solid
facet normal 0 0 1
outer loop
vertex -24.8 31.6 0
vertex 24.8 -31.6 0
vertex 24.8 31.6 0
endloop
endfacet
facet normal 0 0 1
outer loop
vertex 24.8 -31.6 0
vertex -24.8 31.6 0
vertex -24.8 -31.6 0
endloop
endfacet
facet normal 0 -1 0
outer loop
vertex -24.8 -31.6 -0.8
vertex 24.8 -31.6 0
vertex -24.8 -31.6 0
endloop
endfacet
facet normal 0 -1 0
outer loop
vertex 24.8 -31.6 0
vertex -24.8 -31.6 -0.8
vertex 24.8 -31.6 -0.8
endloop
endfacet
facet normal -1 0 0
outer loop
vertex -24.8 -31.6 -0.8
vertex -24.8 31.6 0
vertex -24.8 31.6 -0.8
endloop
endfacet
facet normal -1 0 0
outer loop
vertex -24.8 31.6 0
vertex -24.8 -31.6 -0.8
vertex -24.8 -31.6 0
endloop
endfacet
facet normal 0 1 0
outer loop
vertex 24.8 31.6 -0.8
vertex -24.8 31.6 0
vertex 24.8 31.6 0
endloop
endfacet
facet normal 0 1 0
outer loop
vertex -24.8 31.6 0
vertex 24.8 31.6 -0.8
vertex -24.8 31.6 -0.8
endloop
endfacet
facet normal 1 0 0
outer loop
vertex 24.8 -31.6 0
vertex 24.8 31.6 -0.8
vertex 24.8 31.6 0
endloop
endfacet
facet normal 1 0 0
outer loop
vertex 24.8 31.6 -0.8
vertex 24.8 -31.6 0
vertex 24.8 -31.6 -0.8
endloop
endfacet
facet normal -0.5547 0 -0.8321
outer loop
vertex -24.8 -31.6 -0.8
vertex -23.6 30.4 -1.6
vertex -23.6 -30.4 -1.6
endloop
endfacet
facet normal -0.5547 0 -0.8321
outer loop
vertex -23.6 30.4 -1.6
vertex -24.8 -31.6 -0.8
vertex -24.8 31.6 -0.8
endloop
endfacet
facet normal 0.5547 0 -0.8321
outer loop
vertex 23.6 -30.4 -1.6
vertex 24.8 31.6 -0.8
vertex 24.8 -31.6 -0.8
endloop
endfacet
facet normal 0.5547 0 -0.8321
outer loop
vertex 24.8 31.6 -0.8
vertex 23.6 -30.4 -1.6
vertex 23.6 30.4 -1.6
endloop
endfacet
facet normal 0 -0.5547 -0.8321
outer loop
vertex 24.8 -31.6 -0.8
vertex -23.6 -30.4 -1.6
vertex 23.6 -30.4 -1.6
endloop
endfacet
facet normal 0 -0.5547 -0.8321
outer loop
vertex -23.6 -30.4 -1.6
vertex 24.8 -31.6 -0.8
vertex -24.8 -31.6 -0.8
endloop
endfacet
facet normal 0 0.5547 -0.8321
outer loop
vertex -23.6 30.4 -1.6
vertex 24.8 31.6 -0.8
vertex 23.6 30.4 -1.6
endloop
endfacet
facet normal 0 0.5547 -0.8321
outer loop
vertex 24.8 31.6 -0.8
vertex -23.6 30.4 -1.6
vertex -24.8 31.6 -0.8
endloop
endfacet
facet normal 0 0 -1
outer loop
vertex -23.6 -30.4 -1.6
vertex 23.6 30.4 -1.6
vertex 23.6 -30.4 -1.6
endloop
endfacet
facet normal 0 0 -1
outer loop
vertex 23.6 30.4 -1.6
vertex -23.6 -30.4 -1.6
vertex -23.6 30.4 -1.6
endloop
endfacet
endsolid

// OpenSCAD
// file: ../p/rect.scad
use <../lib.scad>
function ldraw_lib__rect() = [
// 0 Rectangle
// 0 Name: rect.dat
// 0 Author: James Jessiman
// 0 !LDRAW_ORG Primitive UPDATE 2010-01
// 0 !LICENSE Licensed under CC BY 2.0 and CC BY 4.0 : see CAreadme.txt
// 
// 0 BFC CERTIFY CCW
  [0,"BFC","CERTIFY"],
  [0,"BFC","CCW"],
// 
// 0 !HISTORY 2002-04-05 [hafhead] Added BFC statement
// 0 !HISTORY 2002-04-25 [PTadmin] Official Update 2002-02
// 0 !HISTORY 2007-06-24 [PTadmin] Header formatted for Contributor Agreement
// 0 !HISTORY 2008-07-01 [PTadmin] Official Update 2008-01
// 0 !HISTORY 2010-01-17 [mikeheide] changed winding to CCW
// 0 !HISTORY 2010-04-05 [PTadmin] Official Update 2010-01
// 
// 
// 2 24 1 0 1 -1 0 1
  [2,24,1,0,1,-1,0,1],
// 2 24 -1 0 1 -1 0 -1
  [2,24,-1,0,1,-1,0,-1],
// 2 24 -1 0 -1 1 0 -1
  [2,24,-1,0,-1,1,0,-1],
// 2 24 1 0 -1 1 0 1
  [2,24,1,0,-1,1,0,1],
// 4 16 -1 0 1 -1 0 -1 1 0 -1 1 0 1
  [4,16,-1,0,1,-1,0,-1,1,0,-1,1,0,1],
// 0
];
module ldraw_lib__rect(step=0, col=false, unit=2/5, alt=false, line=0.2, solid=!$preview)
    makepoly(ldraw_lib__rect(), step=step, col=col, unit=unit, alt=alt, line=line, solid=solid);
ldraw_lib__rect(line=0.2);
// file: ../p/box5.scad
use <../lib.scad>
function ldraw_lib__box5() = [
// 0 Box with 5 Faces and All Edges
// 0 Name: box5.dat
// 0 Author: James Jessiman
// 0 !LDRAW_ORG Primitive UPDATE 2012-01
// 0 !LICENSE Licensed under CC BY 4.0 : see CAreadme.txt
// 
// 0 BFC CERTIFY CCW
  [0,"BFC","CERTIFY"],
  [0,"BFC","CCW"],
// 
// 0 !HISTORY 2002-04-03 [sbliss] Modified for BFC compliance
// 0 !HISTORY 2002-04-25 [PTadmin] Official Update 2002-02
// 0 !HISTORY 2007-06-24 [PTadmin] Header formatted for Contributor Agreement
// 0 !HISTORY 2008-07-01 [PTadmin] Official Update 2008-01
// 0 !HISTORY 2012-02-16 [Philo] Changed to CCW
// 0 !HISTORY 2012-03-30 [PTadmin] Official Update 2012-01
// 
// 
// 2 24 1 1 1 -1 1 1
  [2,24,1,1,1,-1,1,1],
// 2 24 -1 1 1 -1 1 -1
  [2,24,-1,1,1,-1,1,-1],
// 2 24 -1 1 -1 1 1 -1
  [2,24,-1,1,-1,1,1,-1],
// 2 24 1 1 -1 1 1 1
  [2,24,1,1,-1,1,1,1],
// 2 24 1 0 1 -1 0 1
  [2,24,1,0,1,-1,0,1],
// 2 24 -1 0 1 -1 0 -1
  [2,24,-1,0,1,-1,0,-1],
// 2 24 -1 0 -1 1 0 -1
  [2,24,-1,0,-1,1,0,-1],
// 2 24 1 0 -1 1 0 1
  [2,24,1,0,-1,1,0,1],
// 2 24 1 0 1 1 1 1
  [2,24,1,0,1,1,1,1],
// 2 24 -1 0 1 -1 1 1
  [2,24,-1,0,1,-1,1,1],
// 2 24 1 0 -1 1 1 -1
  [2,24,1,0,-1,1,1,-1],
// 2 24 -1 0 -1 -1 1 -1
  [2,24,-1,0,-1,-1,1,-1],
// 4 16 -1 1 1 1 1 1 1 1 -1 -1 1 -1
  [4,16,-1,1,1,1,1,1,1,1,-1,-1,1,-1],
// 4 16 -1 1 1 -1 0 1 1 0 1 1 1 1
  [4,16,-1,1,1,-1,0,1,1,0,1,1,1,1],
// 4 16 -1 1 -1 -1 0 -1 -1 0 1 -1 1 1
  [4,16,-1,1,-1,-1,0,-1,-1,0,1,-1,1,1],
// 4 16 1 1 -1 1 0 -1 -1 0 -1 -1 1 -1
  [4,16,1,1,-1,1,0,-1,-1,0,-1,-1,1,-1],
// 4 16 1 1 1 1 0 1 1 0 -1 1 1 -1
  [4,16,1,1,1,1,0,1,1,0,-1,1,1,-1],
];
module ldraw_lib__box5(step=0, col=false, unit=2/5, alt=false, line=0.2, solid=!$preview)
    makepoly(ldraw_lib__box5(), step=step, col=col, unit=unit, alt=alt, line=line, solid=solid);
ldraw_lib__box5(line=0.2);
// main file
use <../lib.scad>
use <../p/box5.scad>
use <../p/rect.scad>
function ldraw_lib__u9553() = [
// 0 ~Electric Record and Play Brick 16 x 10 x  4 Lid (Needs Work)
// 0 Name: u9553.dat
// 0 Author: Philippe Hurbain [Philo]
// 0 !LDRAW_ORG Part UPDATE 2022-03
// 0 !LICENSE Licensed under CC BY 4.0 : see CAreadme.txt
// 
// 0 BFC CERTIFY CCW
  [0,"BFC","CERTIFY"],
  [0,"BFC","CCW"],
// 
// 0 !HISTORY 2009-02-06 [Philo] Creation
// 0 !HISTORY 2019-05-24 [Holly-Wood] Removed second 0 BFC CERTIFY CCW
// 0 !HISTORY 2022-05-07 [PTadmin] Official Update 2022-03
// 
// 
// 0 // Needs Work: Decoration and attachments missing
// 
// 1 16 0 2 0 62 0 0 0 -2 0 0 0 -79 box5.dat
  [1,16,0,2,0,62,0,0,0,-2,0,0,0,-79, ldraw_lib__box5()],
// 4 16 -62 2 79 -59 4 76 -59 4 -76 -62 2 -79
  [4,16,-62,2,79,-59,4,76,-59,4,-76,-62,2,-79],
// 4 16 62 2 -79 59 4 -76 59 4 76 62 2 79
  [4,16,62,2,-79,59,4,-76,59,4,76,62,2,79],
// 4 16 -62 2 -79 -59 4 -76 59 4 -76 62 2 -79
  [4,16,-62,2,-79,-59,4,-76,59,4,-76,62,2,-79],
// 4 16 62 2 79 59 4 76 -59 4 76 -62 2 79
  [4,16,62,2,79,59,4,76,-59,4,76,-62,2,79],
// 1 16 0 4 0 59 0 0 0 -1 0 0 0 -76 rect.dat
  [1,16,0,4,0,59,0,0,0,-1,0,0,0,-76, ldraw_lib__rect()],
// 2 24 59 4 76 62 2 79
  [2,24,59,4,76,62,2,79],
// 2 24 -59 4 76 -62 2 79
  [2,24,-59,4,76,-62,2,79],
// 2 24 59 4 -76 62 2 -79
  [2,24,59,4,-76,62,2,-79],
// 2 24 -59 4 -76 -62 2 -79
  [2,24,-59,4,-76,-62,2,-79],
];
module ldraw_lib__u9553(step=0, col=false, unit=2/5, alt=false, line=0.2, solid=!$preview)
    makepoly(ldraw_lib__u9553(), step=step, col=col, unit=unit, alt=alt, line=line, solid=solid);
ldraw_lib__u9553(line=0.2);
